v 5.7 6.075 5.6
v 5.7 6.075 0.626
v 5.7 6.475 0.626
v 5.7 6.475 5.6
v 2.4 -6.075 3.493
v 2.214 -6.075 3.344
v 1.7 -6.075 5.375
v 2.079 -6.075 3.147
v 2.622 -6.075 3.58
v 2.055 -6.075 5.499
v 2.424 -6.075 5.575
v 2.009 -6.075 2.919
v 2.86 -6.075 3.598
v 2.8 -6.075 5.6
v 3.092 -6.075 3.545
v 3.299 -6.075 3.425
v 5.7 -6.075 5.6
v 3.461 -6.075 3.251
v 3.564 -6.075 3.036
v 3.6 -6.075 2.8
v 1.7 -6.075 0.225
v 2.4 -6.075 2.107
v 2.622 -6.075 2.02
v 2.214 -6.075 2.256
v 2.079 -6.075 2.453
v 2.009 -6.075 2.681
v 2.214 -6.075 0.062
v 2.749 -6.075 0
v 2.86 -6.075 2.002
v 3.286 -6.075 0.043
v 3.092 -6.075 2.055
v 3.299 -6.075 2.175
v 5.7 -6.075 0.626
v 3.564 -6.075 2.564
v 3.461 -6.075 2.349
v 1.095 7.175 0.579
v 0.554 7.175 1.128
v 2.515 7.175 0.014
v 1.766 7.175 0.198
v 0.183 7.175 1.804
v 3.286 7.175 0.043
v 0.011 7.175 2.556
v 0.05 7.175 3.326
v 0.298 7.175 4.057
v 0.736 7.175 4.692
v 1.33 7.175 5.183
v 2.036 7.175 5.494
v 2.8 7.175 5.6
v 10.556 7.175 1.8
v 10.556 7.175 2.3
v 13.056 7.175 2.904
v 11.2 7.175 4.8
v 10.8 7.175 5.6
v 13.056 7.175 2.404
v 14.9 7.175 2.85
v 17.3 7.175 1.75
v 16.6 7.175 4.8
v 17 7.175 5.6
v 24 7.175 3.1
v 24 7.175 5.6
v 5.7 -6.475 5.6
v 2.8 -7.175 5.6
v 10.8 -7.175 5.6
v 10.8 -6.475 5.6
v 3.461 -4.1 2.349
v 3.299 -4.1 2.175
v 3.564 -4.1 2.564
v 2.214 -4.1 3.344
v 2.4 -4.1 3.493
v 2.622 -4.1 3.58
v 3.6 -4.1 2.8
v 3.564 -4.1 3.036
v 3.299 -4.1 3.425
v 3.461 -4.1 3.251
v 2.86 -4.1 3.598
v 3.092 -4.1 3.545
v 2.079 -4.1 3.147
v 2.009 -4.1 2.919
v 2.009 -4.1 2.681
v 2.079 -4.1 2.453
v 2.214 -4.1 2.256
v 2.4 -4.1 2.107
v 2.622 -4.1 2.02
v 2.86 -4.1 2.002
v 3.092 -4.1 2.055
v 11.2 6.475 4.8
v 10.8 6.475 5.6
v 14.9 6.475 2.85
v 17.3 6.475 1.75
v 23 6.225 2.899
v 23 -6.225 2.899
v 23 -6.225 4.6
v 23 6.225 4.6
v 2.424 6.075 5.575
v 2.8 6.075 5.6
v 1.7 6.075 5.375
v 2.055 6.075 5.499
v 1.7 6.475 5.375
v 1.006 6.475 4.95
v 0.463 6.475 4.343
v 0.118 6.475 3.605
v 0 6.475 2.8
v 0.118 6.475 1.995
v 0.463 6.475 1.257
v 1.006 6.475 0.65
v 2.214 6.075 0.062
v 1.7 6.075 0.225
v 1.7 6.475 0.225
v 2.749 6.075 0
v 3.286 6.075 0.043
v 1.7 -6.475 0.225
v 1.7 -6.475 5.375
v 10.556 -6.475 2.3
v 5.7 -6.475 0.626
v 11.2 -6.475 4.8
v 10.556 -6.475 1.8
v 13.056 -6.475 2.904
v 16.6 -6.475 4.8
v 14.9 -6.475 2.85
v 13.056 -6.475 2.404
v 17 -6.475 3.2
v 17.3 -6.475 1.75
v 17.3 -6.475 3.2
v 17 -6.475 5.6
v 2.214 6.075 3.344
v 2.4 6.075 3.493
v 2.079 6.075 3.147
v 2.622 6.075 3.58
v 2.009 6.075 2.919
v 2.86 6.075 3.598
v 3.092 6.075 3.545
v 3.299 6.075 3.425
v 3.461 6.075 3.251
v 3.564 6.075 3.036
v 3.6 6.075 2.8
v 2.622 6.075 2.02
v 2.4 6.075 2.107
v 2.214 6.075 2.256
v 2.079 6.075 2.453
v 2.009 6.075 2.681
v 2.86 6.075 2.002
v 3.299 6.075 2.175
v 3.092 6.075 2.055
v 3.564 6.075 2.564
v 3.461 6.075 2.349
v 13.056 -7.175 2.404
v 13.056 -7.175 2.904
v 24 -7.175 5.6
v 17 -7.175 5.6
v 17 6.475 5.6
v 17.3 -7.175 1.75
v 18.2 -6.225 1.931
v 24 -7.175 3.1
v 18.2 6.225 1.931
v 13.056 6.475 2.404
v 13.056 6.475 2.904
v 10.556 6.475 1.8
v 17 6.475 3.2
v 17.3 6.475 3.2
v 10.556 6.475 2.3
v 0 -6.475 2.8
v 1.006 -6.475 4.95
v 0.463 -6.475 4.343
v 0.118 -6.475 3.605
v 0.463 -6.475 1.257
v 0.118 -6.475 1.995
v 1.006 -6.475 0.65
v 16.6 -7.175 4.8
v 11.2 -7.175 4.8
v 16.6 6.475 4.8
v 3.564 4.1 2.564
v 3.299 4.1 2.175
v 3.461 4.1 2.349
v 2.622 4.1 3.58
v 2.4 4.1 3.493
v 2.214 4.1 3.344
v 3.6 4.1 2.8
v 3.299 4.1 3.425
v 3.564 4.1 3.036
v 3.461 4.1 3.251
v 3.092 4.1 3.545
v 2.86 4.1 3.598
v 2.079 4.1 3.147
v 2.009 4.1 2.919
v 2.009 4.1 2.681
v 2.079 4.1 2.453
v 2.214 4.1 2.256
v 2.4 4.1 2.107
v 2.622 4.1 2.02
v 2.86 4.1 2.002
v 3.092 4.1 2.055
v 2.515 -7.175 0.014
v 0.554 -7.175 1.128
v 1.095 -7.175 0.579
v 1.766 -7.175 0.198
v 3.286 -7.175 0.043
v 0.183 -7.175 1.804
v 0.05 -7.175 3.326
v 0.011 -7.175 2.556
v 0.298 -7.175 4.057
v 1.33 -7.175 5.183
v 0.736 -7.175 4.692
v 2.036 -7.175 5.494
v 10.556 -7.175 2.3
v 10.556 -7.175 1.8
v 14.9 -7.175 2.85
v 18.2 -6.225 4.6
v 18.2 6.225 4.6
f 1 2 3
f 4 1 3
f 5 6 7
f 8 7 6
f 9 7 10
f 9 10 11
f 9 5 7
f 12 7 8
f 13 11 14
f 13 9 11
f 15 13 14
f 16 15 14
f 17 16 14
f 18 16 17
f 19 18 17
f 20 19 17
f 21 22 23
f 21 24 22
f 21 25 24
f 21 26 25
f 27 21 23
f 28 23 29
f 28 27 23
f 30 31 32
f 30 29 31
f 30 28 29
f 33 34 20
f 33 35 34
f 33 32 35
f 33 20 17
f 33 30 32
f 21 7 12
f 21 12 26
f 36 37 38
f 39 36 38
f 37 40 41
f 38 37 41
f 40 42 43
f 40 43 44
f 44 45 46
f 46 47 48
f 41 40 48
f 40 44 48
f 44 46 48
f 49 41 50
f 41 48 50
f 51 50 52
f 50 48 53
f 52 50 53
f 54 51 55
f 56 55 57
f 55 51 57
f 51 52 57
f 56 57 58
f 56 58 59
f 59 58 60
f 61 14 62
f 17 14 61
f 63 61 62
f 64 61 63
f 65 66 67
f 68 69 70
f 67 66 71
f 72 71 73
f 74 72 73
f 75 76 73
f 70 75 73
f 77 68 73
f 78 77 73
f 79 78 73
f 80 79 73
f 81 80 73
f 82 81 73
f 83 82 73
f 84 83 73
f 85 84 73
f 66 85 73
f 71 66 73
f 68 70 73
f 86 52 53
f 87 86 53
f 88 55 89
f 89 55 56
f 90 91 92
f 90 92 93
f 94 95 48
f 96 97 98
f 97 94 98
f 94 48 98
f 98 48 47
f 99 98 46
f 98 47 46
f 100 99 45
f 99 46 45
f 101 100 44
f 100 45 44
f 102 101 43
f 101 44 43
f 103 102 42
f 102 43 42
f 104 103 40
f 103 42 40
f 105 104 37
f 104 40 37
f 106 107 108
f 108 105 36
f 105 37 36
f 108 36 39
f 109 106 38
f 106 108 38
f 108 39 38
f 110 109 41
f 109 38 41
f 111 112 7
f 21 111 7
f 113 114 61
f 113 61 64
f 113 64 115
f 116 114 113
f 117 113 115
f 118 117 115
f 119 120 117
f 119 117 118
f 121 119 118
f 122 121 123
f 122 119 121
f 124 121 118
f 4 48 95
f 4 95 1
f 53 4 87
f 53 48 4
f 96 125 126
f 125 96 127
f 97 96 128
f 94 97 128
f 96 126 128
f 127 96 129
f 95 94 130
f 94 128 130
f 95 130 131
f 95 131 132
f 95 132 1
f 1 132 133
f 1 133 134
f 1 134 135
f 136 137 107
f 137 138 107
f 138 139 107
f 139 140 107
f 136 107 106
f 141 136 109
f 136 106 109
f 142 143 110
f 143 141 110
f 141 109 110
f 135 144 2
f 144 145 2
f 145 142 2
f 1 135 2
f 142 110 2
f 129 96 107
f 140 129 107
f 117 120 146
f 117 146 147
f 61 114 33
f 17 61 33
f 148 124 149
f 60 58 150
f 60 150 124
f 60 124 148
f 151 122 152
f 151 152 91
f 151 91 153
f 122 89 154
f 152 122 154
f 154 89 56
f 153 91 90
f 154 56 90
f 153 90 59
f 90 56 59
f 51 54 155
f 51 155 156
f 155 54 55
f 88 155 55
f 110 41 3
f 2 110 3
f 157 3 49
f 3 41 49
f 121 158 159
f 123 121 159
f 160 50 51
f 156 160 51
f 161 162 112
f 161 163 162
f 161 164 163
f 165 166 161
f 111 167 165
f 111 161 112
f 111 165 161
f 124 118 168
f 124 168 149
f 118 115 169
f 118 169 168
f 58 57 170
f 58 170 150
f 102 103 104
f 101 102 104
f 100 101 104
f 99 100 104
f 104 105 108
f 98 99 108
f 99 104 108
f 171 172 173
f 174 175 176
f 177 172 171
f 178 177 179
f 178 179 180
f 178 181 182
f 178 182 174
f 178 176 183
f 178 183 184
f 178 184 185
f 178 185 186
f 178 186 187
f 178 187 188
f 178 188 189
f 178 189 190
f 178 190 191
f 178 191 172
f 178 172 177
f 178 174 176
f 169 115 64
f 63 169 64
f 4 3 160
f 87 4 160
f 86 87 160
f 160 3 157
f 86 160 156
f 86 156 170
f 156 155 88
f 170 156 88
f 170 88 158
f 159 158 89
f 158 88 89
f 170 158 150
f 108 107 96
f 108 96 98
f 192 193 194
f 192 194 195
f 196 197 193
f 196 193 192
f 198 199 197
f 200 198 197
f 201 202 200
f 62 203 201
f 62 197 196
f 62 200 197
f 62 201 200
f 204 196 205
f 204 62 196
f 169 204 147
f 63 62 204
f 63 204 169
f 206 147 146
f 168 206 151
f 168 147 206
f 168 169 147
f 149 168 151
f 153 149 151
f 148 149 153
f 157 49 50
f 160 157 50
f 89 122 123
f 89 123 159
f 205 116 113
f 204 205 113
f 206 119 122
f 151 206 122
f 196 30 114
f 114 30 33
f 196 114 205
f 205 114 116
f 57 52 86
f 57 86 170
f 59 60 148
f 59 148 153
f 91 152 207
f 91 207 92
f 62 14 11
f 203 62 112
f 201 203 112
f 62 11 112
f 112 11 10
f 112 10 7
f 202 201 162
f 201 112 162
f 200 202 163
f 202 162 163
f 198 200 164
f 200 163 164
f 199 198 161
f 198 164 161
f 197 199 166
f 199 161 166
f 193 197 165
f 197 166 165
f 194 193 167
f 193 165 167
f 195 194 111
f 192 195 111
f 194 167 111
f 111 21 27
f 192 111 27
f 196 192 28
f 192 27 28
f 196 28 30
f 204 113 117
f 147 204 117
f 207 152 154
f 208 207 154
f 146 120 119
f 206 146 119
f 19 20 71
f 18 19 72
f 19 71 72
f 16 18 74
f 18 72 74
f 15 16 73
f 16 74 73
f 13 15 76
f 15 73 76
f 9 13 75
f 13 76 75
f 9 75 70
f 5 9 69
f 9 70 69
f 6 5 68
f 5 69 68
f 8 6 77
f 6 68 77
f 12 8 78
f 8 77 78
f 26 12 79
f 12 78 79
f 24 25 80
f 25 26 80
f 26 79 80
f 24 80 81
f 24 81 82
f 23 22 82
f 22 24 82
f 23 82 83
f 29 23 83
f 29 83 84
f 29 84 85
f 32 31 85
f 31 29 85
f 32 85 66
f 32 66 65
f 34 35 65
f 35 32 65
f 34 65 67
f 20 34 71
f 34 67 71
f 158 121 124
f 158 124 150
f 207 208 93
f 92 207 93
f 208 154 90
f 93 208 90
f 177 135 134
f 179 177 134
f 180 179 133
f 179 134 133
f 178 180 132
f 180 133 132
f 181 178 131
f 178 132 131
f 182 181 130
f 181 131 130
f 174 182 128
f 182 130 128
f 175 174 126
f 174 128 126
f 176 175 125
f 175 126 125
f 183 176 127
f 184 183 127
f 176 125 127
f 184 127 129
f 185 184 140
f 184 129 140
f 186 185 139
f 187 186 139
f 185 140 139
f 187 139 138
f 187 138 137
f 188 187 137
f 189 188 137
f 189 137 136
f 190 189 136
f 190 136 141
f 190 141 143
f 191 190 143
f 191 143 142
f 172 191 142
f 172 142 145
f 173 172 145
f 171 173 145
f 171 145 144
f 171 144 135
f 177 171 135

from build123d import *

# Parameters (mm, degrees)
CYLINDER_R        = 0.8
CYLINDER_DEPTH    = 2
CYLINDER001_R     = 0.8
CYLINDER001_DEPTH = 2
BOX004_W          = 0.3
BOX004_H          = 12.95
BOX004_DEPTH      = 3.2
BOX003_W          = 4.8
BOX003_H          = 12.45
BOX003_DEPTH      = 4.6
BOX001_W          = 1.7
BOX001_H          = 12.95
BOX001_DEPTH      = 10
BOX002_W          = 11.3
BOX002_H          = 12.95
BOX002_DEPTH      = 10
BOX_W             = 15.8
BOX_H             = 12.15
BOX_DEPTH         = 10
EXTRUDE_DEPTH     = 14.35


with BuildPart() as cylinder:
    # Cylinder → Cylinder (new body)
    with BuildSketch(Plane(origin=(2.8, -4.1, 2.8), x_dir=(1, 0, 0), z_dir=(0, -1, 0))):
        Circle(CYLINDER_R)
    extrude(amount=CYLINDER_DEPTH)


with BuildPart() as cylinder001:
    # Cylinder001 → Cylinder001 (new body)
    with BuildSketch(Plane(origin=(2.8, 6.1, 2.8), x_dir=(1, 0, 0), z_dir=(0, -1, 0))):
        Circle(CYLINDER001_R)
    extrude(amount=CYLINDER001_DEPTH)


with BuildPart() as cube004:
    # Box004 → Box004 (new body)
    with BuildSketch(Plane(origin=(17, -6.475, 0), x_dir=(1, 0, 0), z_dir=(0, 0, 1))):
        with Locations((0.15, 6.475)):
            Rectangle(BOX004_W, BOX004_H)
    extrude(amount=BOX004_DEPTH)


with BuildPart() as compound001:
    # Box003 → Box003 (new body)
    with BuildSketch(Plane(origin=(18.2, -6.225, 0), x_dir=(1, 0, 0), z_dir=(0, 0, 1))):
        with Locations((2.4, 6.225)):
            Rectangle(BOX003_W, BOX003_H)
    extrude(amount=BOX003_DEPTH)

    # Compound001: union Cube004
    add(cube004.part)


with BuildPart() as cube001:
    # Box001 → Box001 (new body)
    with BuildSketch(Plane(origin=(0, -6.475, 0), x_dir=(1, 0, 0), z_dir=(0, 0, 1))):
        with Locations((0.85, 6.475)):
            Rectangle(BOX001_W, BOX001_H)
    extrude(amount=BOX001_DEPTH)


with BuildPart() as compound:
    # Box002 → Box002 (new body)
    with BuildSketch(Plane(origin=(5.7, -6.475, 0), x_dir=(1, 0, 0), z_dir=(0, 0, 1))):
        with Locations((5.65, 6.475)):
            Rectangle(BOX002_W, BOX002_H)
    extrude(amount=BOX002_DEPTH)

    # Compound: union Cube001
    add(cube001.part)


with BuildPart() as cube:
    # Box → Box (new body)
    with BuildSketch(Plane(origin=(0, -6.075, 0), x_dir=(1, 0, 0), z_dir=(0, 0, 1))):
        with Locations((7.9, 6.075)):
            Rectangle(BOX_W, BOX_H)
    extrude(amount=BOX_DEPTH)


with BuildPart() as fusion:
    # Sketch → Extrude (new body)
    with BuildSketch(Plane.XZ):
        with BuildLine():
            ThreePointArc((2.8, 5.6), (0.010655, 2.555964), (3.286215, 0.042538))
            Line((3.286215, 0.042538), (10.556406, 1.8))
            Line((10.556406, 1.8), (10.556406, 2.3))
            Line((10.556406, 2.3), (13.056406, 2.904338))
            Line((13.056406, 2.404338), (13.056406, 2.904338))
            Line((13.056406, 2.404338), (14.9, 2.85))
            Line((14.9, 2.85), (17.3, 1.75))
            Line((17.3, 1.75), (24, 3.1))
            Line((24, 5.6), (24, 3.1))
            Line((17, 5.6), (24, 5.6))
            Line((16.6, 4.8), (17, 5.6))
            Line((11.2, 4.8), (16.6, 4.8))
            Line((11.2, 4.8), (10.8, 5.6))
            Line((2.8, 5.6), (10.8, 5.6))
        make_face()
    extrude(amount=EXTRUDE_DEPTH)


with BuildPart() as fusion_1:
    # Extrude placement: moved
    add(fusion.part.moved(Location((0, 7.175, 0))))

    # Cut: cut Cube
    add(cube.part, mode=Mode.SUBTRACT)

    # Cut001: cut Compound
    add(compound.part, mode=Mode.SUBTRACT)

    # Cut002: cut Compound001
    add(compound001.part, mode=Mode.SUBTRACT)

    # Fusion: union Cylinder, Cylinder001
    add(cylinder.part)
    add(cylinder001.part)


solid = fusion_1.part
